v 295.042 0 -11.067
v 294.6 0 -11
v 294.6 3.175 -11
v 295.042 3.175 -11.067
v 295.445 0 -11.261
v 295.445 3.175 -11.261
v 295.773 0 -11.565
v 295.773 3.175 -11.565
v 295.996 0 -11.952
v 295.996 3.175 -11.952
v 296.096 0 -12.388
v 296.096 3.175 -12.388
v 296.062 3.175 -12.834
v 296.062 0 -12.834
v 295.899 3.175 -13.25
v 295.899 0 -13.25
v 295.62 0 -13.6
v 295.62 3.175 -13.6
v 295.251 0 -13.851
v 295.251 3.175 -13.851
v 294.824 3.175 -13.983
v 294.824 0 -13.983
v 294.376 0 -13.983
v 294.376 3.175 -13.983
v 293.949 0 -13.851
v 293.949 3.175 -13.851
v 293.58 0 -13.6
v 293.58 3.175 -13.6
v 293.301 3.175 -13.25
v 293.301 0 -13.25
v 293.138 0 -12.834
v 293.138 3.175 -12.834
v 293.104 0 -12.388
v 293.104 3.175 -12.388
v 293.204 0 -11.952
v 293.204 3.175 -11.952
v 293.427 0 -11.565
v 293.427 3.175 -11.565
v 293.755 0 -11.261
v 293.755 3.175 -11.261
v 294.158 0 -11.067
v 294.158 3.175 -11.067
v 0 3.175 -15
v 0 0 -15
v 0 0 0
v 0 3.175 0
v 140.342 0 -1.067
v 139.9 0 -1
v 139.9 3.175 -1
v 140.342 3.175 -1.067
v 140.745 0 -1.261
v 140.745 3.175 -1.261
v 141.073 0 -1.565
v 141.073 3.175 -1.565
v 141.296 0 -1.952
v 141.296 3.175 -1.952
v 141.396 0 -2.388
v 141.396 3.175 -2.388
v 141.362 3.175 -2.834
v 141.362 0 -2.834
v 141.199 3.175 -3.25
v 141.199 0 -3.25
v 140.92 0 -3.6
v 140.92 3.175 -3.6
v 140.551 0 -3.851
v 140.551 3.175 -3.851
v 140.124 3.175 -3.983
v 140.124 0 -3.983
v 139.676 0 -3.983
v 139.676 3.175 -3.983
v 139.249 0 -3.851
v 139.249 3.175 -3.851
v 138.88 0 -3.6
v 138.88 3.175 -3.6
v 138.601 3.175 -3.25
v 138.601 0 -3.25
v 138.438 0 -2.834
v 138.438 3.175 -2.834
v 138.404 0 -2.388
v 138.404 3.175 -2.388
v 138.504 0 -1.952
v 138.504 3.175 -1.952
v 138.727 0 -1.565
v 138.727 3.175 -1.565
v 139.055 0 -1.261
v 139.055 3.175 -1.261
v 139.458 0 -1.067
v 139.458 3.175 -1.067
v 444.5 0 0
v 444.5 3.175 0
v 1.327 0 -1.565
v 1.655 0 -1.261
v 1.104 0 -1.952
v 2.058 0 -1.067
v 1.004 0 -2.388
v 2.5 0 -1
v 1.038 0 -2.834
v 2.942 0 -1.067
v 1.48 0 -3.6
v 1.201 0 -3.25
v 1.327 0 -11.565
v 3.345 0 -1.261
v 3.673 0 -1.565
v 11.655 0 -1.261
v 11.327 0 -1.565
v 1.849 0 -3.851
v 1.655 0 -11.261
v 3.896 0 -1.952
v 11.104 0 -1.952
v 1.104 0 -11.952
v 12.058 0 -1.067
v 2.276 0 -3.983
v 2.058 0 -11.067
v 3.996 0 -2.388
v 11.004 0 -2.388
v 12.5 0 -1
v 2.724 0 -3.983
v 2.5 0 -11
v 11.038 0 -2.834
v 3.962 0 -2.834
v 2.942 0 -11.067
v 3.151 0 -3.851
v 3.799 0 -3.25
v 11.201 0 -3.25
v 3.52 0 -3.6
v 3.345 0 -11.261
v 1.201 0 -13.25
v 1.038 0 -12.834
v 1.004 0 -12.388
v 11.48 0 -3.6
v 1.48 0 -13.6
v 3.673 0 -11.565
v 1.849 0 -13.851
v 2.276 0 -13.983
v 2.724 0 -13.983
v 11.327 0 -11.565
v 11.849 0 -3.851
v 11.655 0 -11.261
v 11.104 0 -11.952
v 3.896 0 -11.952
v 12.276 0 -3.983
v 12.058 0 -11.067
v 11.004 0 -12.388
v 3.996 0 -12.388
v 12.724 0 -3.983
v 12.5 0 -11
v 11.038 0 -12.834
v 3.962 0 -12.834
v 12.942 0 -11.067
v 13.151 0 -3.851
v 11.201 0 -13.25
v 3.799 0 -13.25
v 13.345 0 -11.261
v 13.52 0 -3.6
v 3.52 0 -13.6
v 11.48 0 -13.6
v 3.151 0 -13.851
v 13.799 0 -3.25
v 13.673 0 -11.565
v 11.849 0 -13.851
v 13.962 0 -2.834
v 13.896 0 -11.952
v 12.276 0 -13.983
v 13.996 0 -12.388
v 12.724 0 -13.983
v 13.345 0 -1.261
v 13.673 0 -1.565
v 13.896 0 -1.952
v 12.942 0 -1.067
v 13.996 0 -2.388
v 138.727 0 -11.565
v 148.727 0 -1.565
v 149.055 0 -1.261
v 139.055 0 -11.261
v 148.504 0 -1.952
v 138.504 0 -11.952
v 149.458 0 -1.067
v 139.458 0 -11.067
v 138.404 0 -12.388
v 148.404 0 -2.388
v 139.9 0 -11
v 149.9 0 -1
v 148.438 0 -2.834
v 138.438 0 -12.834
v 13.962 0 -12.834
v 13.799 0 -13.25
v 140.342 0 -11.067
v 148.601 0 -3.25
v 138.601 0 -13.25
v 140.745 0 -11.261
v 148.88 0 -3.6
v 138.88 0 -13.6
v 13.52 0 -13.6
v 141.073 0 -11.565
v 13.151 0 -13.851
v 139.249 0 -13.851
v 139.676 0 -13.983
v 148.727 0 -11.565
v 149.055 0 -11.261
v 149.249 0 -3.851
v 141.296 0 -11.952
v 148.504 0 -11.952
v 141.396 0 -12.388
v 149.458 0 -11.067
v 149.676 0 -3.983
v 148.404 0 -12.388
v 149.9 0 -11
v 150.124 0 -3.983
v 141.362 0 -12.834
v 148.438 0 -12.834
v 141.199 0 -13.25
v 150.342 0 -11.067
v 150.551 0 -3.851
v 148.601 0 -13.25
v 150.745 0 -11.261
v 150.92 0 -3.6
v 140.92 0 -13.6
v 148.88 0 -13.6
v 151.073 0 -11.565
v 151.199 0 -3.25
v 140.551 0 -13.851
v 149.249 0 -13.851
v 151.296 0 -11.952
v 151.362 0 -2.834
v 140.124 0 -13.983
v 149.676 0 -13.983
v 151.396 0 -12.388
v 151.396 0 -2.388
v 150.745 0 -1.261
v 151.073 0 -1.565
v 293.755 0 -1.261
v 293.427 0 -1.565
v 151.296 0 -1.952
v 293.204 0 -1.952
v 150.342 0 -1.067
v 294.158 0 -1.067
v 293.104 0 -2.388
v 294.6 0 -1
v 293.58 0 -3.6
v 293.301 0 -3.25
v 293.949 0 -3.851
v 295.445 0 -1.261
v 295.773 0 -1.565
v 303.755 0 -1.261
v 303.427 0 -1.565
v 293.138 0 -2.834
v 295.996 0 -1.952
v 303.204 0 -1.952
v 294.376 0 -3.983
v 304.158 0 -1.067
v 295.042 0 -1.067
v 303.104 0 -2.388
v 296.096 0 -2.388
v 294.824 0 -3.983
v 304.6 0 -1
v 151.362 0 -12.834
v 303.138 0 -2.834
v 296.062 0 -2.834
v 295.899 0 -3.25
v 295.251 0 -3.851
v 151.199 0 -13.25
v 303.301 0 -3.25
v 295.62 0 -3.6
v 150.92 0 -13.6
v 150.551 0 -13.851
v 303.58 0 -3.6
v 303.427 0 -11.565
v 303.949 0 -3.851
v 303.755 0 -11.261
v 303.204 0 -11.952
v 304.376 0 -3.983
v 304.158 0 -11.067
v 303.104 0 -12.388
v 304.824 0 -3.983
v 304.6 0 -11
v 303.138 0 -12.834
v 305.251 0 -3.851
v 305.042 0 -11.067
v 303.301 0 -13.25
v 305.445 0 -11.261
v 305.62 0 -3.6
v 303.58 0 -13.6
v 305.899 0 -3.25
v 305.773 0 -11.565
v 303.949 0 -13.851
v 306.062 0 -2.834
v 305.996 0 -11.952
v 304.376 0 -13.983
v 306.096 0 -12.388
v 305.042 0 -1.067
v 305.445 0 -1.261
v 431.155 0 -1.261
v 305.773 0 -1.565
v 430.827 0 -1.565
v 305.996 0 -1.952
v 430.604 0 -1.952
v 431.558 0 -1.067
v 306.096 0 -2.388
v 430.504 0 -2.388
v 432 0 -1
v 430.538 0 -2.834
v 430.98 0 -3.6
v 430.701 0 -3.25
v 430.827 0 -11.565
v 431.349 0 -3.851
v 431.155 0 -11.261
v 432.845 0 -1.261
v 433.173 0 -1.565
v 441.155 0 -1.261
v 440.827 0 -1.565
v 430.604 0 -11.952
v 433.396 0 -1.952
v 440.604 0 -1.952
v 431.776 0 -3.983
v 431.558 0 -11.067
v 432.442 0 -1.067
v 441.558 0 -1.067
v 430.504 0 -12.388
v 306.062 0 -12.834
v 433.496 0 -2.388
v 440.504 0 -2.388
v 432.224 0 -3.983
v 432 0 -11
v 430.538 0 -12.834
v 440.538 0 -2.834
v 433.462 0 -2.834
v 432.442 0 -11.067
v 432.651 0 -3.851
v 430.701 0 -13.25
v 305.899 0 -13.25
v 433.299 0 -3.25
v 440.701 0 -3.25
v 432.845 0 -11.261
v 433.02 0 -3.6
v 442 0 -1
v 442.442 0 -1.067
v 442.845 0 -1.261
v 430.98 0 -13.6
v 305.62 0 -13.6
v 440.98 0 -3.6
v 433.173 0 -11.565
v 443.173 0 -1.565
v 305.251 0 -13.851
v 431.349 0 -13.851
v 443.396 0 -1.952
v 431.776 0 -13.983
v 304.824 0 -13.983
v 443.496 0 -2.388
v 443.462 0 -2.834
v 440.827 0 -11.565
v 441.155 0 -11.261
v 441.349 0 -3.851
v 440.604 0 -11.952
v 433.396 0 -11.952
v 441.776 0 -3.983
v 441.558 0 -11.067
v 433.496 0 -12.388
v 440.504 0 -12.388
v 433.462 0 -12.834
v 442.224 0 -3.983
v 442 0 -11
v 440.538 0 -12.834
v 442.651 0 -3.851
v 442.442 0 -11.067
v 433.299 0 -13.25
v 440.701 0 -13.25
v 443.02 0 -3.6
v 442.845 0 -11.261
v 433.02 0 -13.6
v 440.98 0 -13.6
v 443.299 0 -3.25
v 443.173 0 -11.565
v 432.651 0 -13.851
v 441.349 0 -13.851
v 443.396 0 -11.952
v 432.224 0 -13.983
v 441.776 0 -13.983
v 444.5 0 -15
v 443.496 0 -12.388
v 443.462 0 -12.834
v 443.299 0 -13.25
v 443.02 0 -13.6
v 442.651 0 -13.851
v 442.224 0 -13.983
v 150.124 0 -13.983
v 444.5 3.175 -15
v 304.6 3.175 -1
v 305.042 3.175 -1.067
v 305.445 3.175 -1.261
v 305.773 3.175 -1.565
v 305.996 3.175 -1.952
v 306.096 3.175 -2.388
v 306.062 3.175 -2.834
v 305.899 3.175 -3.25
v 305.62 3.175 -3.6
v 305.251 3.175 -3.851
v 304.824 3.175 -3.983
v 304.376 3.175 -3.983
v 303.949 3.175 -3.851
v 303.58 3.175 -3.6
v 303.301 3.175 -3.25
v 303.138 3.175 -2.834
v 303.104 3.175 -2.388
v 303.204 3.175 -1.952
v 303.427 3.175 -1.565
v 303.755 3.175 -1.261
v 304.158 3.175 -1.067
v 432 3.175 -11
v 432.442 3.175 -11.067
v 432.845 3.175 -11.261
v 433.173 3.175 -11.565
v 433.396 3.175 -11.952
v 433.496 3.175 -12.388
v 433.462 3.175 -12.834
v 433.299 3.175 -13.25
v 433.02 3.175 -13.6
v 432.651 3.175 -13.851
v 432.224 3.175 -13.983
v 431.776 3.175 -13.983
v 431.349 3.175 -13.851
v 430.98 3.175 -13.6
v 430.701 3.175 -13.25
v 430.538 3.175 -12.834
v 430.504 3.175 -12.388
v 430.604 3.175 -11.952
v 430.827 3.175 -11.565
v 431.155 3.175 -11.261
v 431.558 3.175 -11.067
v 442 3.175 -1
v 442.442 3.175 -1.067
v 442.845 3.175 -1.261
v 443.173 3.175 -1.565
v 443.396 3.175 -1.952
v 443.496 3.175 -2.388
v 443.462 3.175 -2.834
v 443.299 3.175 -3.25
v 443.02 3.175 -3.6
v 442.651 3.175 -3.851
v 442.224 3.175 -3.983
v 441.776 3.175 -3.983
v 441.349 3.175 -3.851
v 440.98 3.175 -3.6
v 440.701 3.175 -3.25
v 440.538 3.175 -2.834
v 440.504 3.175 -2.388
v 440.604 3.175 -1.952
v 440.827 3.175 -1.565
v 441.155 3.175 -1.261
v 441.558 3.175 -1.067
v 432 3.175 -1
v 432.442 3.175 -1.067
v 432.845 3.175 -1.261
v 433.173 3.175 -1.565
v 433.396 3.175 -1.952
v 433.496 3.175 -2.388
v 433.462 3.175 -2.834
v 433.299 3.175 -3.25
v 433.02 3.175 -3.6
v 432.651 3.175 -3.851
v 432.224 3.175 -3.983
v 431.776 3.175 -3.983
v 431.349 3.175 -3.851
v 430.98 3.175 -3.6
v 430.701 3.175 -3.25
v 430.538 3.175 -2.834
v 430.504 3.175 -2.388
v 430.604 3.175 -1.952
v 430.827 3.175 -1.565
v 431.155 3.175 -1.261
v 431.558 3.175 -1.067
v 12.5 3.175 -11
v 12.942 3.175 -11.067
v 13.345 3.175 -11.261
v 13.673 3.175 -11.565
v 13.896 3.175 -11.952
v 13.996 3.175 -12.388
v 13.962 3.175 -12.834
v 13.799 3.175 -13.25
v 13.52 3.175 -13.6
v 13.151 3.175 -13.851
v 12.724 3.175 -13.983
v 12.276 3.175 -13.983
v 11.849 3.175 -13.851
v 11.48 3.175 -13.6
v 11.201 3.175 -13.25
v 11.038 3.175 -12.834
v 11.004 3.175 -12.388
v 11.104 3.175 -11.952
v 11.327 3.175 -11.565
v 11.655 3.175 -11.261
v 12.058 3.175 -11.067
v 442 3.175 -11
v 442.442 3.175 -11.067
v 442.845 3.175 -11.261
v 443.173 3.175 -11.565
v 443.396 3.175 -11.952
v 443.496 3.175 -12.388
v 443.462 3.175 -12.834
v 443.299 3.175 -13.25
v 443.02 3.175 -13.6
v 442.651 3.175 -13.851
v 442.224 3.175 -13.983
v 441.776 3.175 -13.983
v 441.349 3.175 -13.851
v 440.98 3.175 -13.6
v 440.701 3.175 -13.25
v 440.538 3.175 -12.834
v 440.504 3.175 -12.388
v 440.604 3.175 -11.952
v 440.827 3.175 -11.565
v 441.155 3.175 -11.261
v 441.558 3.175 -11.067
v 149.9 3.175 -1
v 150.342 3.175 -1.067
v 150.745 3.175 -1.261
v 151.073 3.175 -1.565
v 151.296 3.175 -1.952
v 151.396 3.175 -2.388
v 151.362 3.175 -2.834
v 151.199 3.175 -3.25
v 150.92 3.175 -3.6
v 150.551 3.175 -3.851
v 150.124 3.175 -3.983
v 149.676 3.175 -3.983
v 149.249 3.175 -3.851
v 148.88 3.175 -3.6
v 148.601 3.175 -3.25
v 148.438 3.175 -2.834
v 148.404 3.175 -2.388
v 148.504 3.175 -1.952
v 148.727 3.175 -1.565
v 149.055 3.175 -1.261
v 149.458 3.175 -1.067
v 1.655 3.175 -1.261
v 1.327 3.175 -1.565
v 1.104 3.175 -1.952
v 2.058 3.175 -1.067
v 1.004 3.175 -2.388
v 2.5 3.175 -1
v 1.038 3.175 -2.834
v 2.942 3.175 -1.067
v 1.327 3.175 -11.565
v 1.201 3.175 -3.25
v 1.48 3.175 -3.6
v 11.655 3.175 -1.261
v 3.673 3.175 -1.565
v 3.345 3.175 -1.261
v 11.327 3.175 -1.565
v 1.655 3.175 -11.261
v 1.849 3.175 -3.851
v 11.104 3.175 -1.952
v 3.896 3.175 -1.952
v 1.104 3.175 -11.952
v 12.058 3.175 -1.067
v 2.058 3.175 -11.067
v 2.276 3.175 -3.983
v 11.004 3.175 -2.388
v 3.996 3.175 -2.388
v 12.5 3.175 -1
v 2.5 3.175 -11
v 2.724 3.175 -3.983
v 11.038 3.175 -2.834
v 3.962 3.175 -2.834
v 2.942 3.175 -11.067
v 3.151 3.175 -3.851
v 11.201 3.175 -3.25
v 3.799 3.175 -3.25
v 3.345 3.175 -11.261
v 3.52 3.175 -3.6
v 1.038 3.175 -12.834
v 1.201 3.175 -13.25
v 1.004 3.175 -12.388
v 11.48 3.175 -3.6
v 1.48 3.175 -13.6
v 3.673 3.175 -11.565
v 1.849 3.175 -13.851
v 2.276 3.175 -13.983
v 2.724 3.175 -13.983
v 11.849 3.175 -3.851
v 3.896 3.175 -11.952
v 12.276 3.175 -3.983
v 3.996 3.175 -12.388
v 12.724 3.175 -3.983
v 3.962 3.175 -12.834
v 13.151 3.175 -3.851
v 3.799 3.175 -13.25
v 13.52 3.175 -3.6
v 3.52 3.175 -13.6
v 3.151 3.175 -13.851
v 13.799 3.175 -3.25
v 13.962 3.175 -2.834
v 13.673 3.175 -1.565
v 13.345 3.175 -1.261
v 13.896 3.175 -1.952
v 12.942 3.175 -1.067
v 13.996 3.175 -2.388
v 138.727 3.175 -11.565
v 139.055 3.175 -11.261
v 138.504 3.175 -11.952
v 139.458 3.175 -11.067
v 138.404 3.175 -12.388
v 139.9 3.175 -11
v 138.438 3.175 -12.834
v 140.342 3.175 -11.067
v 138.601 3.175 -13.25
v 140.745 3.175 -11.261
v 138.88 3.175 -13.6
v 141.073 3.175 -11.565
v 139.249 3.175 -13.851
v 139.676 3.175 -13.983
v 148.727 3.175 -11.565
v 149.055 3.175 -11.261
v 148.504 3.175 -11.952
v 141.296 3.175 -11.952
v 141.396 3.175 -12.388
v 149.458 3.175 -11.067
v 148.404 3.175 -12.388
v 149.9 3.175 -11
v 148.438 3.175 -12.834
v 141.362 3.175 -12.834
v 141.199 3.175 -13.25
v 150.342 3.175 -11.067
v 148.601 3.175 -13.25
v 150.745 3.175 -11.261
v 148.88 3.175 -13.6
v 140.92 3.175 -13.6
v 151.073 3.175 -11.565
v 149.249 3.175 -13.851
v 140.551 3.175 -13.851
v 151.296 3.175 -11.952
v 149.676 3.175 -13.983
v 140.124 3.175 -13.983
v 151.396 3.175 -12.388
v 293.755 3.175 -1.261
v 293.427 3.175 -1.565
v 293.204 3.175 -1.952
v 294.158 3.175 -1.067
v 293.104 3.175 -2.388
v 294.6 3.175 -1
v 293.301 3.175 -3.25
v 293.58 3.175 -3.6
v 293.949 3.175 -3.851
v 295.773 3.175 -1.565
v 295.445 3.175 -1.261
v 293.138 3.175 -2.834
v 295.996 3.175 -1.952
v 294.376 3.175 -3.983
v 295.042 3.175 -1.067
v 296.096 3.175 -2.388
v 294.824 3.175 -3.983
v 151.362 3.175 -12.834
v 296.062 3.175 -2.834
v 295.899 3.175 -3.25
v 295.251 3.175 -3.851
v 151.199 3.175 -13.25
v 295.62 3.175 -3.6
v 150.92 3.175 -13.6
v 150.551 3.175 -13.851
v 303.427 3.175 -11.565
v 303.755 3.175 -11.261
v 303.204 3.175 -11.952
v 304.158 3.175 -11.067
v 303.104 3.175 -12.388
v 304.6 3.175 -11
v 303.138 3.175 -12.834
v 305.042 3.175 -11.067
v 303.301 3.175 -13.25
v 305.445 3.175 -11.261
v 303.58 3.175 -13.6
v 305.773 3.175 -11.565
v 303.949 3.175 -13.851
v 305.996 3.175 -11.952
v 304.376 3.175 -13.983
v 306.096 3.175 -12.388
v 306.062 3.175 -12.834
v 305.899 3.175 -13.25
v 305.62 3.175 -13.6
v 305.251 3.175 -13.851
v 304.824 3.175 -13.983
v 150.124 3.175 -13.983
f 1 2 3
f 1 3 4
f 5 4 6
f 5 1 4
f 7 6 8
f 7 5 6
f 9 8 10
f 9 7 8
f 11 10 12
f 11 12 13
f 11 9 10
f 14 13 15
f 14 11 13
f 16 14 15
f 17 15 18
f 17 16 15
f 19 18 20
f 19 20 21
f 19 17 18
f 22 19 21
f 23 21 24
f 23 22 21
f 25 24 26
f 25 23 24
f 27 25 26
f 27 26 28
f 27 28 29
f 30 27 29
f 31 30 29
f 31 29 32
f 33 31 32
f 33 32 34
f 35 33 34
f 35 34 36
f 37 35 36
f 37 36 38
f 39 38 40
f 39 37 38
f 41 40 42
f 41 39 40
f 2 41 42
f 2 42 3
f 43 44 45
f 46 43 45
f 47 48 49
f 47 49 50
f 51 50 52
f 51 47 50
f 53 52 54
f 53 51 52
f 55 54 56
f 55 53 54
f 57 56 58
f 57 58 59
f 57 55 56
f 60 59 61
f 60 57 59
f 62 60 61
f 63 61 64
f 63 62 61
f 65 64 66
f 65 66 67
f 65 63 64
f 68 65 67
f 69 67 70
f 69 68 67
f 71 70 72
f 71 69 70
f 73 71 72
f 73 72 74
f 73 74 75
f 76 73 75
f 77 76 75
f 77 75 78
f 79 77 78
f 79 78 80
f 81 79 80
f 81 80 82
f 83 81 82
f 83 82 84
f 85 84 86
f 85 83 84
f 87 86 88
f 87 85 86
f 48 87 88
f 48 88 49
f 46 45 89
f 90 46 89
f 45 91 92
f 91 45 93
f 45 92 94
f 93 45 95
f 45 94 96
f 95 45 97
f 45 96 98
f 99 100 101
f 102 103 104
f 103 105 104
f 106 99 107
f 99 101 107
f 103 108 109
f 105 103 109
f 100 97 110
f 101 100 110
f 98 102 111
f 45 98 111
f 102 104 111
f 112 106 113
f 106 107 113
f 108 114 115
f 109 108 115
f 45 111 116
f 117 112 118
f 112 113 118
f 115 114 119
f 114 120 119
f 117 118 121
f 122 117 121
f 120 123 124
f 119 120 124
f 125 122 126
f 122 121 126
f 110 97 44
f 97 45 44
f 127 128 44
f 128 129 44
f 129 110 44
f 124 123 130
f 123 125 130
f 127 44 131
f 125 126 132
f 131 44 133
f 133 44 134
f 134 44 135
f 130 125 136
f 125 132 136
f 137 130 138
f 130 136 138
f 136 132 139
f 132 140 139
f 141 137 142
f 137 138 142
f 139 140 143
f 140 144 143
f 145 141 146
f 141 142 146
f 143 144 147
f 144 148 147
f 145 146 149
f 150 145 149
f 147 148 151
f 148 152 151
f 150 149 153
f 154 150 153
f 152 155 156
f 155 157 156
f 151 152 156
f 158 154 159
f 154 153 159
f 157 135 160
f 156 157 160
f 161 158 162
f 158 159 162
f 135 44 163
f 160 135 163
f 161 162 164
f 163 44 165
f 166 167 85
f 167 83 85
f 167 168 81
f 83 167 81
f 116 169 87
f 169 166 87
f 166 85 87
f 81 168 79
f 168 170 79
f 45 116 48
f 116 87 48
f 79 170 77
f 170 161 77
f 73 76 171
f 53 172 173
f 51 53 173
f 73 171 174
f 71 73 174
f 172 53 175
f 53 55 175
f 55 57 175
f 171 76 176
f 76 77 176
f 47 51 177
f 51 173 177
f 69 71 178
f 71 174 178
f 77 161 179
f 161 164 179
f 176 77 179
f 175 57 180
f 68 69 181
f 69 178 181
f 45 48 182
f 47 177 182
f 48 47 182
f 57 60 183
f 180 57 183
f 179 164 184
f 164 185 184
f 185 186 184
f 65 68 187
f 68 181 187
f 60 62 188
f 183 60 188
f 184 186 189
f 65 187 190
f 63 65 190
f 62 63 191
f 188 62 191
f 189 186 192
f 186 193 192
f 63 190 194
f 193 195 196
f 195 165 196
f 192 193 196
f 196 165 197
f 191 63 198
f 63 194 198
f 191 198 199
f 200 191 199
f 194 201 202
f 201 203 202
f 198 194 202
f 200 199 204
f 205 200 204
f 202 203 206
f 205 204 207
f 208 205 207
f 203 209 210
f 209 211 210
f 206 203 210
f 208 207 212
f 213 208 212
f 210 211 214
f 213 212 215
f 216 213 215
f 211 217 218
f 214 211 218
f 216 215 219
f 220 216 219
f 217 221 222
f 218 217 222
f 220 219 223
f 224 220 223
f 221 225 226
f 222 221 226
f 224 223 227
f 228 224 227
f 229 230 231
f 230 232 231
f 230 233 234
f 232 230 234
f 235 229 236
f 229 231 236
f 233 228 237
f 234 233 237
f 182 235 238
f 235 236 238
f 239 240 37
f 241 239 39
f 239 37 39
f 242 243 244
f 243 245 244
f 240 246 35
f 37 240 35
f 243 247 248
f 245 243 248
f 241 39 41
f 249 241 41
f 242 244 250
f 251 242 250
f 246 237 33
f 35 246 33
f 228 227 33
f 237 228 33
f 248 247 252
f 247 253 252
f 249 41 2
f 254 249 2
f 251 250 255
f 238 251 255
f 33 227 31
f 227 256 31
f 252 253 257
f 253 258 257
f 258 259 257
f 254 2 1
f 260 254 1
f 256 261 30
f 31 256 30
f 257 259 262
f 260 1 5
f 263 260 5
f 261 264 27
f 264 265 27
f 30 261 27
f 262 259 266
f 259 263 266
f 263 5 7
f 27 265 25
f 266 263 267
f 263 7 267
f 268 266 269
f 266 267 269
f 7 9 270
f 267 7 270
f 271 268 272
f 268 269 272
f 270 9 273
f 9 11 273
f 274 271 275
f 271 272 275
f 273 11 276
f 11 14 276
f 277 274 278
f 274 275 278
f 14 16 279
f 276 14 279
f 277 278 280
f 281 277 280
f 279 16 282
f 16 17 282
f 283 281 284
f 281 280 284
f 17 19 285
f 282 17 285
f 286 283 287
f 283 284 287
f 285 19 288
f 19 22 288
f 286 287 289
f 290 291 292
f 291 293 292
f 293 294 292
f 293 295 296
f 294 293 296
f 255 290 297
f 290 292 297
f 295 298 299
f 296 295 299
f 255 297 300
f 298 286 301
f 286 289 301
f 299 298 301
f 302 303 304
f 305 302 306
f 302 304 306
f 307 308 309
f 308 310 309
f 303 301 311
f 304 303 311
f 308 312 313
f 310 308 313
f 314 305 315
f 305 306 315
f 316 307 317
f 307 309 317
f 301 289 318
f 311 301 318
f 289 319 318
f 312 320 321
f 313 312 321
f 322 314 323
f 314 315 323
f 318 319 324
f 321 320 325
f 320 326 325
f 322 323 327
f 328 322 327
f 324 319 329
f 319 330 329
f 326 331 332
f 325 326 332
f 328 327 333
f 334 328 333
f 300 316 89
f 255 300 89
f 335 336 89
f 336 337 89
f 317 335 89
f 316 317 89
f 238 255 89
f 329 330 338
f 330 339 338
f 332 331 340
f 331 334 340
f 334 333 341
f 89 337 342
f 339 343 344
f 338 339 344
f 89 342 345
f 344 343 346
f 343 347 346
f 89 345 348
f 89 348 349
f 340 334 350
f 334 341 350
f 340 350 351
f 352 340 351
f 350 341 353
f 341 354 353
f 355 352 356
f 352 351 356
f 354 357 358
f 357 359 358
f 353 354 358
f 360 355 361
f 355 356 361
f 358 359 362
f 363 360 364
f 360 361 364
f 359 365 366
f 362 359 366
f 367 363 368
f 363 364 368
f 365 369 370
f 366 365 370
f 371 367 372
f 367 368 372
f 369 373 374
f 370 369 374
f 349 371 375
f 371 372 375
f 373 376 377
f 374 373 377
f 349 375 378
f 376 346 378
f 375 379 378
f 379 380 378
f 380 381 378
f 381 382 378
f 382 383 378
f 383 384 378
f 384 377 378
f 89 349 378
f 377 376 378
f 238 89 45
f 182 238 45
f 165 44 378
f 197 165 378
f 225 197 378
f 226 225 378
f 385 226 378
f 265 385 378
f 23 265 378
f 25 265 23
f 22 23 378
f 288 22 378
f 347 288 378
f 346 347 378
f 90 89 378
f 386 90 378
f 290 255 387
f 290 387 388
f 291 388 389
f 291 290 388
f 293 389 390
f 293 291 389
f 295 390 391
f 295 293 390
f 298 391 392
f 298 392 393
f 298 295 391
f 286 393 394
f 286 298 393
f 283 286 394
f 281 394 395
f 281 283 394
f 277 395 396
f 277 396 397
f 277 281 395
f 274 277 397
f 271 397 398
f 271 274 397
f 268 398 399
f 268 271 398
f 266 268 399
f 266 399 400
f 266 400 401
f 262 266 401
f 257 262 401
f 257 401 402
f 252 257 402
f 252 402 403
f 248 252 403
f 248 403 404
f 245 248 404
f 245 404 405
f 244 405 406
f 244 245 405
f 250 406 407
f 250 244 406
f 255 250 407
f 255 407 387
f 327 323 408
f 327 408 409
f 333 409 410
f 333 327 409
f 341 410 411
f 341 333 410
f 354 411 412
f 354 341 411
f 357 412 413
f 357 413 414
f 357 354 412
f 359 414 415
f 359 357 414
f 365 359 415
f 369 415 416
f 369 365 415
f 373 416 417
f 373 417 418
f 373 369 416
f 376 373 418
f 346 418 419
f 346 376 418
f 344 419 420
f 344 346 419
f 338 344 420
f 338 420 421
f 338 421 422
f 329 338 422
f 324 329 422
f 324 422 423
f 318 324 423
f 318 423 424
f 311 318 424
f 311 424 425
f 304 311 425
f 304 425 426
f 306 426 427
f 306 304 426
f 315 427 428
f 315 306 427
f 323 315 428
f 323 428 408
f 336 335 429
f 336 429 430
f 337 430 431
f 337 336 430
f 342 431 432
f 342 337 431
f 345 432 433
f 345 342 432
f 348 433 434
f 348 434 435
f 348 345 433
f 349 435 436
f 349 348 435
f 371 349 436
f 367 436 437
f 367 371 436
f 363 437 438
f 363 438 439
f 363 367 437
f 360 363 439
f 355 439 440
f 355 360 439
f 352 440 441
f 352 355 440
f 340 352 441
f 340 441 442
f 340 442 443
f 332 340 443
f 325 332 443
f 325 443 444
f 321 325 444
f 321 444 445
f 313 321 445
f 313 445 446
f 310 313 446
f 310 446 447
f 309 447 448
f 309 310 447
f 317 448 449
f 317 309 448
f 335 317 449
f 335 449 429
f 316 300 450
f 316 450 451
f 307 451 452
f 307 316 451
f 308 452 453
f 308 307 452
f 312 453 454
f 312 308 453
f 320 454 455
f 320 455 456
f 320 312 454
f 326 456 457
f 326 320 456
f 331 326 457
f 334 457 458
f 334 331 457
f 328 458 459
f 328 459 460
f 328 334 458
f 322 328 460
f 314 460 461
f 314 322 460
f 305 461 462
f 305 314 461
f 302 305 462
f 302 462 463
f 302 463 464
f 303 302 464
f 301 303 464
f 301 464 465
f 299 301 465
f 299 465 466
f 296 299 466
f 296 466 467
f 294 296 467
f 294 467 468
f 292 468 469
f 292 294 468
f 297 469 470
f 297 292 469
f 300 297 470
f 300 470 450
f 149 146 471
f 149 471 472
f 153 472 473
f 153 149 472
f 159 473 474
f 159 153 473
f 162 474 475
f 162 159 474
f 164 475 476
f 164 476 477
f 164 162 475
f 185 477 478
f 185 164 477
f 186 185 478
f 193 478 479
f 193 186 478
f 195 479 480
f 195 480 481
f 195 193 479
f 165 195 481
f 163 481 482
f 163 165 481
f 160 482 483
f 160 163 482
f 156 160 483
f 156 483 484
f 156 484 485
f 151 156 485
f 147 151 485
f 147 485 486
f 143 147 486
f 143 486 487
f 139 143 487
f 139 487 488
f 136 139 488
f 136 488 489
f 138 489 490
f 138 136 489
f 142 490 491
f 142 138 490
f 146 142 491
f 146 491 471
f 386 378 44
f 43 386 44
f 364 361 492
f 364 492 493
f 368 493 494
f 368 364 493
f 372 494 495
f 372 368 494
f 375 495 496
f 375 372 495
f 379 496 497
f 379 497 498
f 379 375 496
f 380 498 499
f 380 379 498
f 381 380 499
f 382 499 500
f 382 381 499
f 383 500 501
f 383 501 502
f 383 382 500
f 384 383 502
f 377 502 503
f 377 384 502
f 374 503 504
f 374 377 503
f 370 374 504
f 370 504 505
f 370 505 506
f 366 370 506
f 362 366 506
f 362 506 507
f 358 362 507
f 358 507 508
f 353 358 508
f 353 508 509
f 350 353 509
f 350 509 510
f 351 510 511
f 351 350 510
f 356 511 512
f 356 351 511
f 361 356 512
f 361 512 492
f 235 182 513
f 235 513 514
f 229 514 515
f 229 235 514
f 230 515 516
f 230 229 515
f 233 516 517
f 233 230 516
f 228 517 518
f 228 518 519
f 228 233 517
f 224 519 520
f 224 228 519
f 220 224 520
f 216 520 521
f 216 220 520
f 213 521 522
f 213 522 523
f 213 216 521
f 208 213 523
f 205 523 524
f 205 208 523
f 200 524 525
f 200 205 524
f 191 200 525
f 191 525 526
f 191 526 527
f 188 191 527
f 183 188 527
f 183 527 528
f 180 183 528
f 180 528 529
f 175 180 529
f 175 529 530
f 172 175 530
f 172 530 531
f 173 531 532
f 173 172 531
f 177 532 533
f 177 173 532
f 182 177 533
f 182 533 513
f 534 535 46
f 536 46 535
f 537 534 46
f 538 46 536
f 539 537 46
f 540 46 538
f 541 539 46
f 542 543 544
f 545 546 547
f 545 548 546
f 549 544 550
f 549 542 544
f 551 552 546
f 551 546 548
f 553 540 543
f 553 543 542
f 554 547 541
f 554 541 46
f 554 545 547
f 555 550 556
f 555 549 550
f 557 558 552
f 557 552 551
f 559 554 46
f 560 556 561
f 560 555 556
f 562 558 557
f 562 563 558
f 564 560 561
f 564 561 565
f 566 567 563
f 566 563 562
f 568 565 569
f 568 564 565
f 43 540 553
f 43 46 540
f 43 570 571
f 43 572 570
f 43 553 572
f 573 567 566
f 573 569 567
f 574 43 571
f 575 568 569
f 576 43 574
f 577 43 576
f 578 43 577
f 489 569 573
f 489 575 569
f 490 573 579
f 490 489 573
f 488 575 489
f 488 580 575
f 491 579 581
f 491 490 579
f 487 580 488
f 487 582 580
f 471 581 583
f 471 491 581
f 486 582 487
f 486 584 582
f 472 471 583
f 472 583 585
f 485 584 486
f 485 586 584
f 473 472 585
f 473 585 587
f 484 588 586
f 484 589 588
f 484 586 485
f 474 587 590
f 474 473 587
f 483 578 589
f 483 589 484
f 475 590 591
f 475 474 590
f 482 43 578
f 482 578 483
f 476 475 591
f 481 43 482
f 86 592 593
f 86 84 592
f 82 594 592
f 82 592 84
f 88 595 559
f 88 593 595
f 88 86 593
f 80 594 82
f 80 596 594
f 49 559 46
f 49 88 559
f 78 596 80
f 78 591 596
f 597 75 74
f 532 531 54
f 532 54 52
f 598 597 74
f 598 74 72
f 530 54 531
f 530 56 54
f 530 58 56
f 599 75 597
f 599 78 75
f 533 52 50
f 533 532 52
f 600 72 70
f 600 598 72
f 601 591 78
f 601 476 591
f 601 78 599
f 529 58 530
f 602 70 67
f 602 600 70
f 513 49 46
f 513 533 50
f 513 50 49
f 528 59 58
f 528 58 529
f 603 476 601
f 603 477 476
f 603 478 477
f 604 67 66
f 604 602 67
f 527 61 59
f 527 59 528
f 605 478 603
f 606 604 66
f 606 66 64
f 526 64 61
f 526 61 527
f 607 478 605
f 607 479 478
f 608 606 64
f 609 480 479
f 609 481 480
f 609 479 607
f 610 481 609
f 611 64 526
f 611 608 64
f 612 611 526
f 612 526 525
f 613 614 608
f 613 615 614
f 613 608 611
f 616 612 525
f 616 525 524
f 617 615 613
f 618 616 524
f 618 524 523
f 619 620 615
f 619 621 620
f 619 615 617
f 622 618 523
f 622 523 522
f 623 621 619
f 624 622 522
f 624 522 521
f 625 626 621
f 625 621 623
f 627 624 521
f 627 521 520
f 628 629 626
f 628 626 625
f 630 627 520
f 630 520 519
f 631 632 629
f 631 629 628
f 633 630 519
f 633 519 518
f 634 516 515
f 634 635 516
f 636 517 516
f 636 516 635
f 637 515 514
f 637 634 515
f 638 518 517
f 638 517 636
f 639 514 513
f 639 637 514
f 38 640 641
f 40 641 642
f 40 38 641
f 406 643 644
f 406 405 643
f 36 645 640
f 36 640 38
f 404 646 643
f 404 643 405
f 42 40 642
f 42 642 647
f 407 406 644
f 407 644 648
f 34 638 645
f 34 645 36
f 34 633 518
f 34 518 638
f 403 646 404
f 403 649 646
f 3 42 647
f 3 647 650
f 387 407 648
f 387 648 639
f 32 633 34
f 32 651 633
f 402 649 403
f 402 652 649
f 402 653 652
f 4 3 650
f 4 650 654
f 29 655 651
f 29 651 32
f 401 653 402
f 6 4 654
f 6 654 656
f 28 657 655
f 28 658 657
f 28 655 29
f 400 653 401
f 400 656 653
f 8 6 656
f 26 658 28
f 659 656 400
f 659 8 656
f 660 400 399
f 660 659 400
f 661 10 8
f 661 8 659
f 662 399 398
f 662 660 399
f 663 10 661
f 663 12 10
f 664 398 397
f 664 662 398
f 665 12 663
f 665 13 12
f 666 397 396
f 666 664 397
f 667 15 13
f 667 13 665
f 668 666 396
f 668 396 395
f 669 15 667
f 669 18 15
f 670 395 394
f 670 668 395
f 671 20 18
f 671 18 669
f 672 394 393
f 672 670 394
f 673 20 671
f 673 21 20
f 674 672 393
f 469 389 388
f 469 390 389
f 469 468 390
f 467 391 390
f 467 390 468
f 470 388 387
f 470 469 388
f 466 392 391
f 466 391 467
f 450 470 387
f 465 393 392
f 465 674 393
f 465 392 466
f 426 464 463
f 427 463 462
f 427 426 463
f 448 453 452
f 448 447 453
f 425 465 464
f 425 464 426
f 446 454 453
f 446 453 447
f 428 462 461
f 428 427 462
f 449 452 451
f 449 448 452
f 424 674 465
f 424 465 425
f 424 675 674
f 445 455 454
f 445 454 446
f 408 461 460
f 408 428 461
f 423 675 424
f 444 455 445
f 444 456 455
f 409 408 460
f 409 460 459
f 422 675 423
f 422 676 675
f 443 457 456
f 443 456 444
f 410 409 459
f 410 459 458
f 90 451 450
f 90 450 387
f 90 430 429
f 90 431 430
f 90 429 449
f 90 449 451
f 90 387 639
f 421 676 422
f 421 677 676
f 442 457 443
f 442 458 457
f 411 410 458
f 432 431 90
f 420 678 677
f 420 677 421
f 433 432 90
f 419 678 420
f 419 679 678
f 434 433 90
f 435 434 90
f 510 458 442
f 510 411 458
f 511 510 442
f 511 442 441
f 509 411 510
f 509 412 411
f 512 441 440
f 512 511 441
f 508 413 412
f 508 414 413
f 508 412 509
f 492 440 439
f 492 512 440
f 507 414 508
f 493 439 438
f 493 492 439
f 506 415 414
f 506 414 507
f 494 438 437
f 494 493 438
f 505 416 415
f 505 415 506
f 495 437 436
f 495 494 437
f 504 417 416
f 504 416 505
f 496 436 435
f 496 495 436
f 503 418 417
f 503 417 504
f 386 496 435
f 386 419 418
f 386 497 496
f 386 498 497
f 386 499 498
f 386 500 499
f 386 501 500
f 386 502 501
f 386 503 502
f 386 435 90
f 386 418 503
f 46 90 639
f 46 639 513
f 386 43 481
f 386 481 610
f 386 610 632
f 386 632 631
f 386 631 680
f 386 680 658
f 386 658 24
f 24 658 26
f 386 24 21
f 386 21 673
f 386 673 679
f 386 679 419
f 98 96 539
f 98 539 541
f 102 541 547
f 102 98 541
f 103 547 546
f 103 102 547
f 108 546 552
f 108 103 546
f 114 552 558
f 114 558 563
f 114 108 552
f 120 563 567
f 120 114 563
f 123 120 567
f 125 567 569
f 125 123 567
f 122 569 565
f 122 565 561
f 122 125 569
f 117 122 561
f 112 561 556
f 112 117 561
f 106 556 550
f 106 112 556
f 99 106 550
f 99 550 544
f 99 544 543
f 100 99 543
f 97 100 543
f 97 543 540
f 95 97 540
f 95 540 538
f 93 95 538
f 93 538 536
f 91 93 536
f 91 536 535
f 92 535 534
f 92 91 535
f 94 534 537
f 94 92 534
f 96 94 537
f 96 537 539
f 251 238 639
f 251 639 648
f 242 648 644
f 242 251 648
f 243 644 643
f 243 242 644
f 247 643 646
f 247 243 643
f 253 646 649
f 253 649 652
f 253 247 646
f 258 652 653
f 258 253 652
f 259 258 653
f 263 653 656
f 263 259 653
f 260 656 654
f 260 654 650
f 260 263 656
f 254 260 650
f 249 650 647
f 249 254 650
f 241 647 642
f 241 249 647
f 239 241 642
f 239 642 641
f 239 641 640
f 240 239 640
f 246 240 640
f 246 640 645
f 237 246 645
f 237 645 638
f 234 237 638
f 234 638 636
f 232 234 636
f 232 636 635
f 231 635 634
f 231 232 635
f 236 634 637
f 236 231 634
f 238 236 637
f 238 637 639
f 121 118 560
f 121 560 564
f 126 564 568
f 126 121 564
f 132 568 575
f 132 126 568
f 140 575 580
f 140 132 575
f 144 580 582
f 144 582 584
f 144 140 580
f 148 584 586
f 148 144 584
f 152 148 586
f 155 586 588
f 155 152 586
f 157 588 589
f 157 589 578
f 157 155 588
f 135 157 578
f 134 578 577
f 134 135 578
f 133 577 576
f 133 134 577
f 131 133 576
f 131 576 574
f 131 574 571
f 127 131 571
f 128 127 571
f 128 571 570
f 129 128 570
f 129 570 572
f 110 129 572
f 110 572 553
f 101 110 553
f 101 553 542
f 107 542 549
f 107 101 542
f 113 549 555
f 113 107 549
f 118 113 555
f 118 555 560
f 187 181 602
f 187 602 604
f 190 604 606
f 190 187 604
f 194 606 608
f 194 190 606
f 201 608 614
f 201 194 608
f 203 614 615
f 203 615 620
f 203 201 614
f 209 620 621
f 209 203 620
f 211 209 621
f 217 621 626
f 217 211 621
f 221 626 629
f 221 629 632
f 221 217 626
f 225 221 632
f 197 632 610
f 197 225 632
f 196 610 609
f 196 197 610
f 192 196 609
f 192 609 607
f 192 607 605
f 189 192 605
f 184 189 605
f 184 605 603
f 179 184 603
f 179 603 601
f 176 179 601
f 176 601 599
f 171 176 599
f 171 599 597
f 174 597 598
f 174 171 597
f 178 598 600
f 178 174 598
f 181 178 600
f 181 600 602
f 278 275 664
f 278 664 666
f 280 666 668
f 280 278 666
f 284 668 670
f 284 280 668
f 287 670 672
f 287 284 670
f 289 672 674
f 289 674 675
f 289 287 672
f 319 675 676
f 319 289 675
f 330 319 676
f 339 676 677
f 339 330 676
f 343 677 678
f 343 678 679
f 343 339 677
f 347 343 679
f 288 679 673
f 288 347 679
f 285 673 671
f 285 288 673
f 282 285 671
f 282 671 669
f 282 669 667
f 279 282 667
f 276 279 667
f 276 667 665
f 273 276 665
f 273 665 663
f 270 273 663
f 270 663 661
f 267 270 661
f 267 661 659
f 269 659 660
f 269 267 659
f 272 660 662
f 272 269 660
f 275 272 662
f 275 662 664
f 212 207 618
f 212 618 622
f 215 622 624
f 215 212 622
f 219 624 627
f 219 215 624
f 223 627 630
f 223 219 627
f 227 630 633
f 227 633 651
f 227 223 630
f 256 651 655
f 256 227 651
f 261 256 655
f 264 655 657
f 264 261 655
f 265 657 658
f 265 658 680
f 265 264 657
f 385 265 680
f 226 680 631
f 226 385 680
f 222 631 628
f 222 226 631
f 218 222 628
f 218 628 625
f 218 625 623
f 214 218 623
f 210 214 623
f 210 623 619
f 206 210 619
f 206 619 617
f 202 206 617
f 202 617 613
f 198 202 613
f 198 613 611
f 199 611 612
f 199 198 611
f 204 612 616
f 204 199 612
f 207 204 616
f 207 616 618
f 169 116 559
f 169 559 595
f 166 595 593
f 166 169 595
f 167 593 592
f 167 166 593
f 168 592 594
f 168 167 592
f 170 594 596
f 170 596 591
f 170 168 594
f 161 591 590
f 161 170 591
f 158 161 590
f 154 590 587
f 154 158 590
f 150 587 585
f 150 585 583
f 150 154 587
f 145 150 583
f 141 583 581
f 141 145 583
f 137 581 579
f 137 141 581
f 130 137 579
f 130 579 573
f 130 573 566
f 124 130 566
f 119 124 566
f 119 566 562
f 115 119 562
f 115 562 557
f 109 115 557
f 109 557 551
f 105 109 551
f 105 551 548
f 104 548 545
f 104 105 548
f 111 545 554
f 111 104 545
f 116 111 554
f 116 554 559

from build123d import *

# Parameters (mm, degrees)
SKETCH1_R           = 1.5
BOSS_EXTRUDE1_DEPTH = 3.175


with BuildPart() as part:
    # Sketch1 → Boss-Extrude1 (new body)
    with BuildSketch(Plane(origin=(0, 0, 0), x_dir=(1, 0, 0), z_dir=(0, 1, 0))):
        Polygon((0, 7.5), (0, 0), (444.5, 0), (444.5, 15), (0, 15), align=None)
        with Locations(Location((2.5, 2.5, 0), (0, 0, 270))):
            Circle(SKETCH1_R, mode=Mode.SUBTRACT)
        with Locations(Location((12.5, 2.5, 0), (0, 0, 270))):
            Circle(SKETCH1_R, mode=Mode.SUBTRACT)
        with Locations(Location((139.9, 2.5, 0), (0, 0, 270))):
            Circle(SKETCH1_R, mode=Mode.SUBTRACT)
        with Locations(Location((149.9, 2.5, 0), (0, 0, 270))):
            Circle(SKETCH1_R, mode=Mode.SUBTRACT)
        with Locations(Location((2.5, 12.5, 0), (0, 0, 270))):
            Circle(SKETCH1_R, mode=Mode.SUBTRACT)
        with Locations(Location((12.5, 12.5, 0), (0, 0, 270))):
            Circle(SKETCH1_R, mode=Mode.SUBTRACT)
        with Locations(Location((139.9, 12.5, 0), (0, 0, 270))):
            Circle(SKETCH1_R, mode=Mode.SUBTRACT)
        with Locations(Location((149.9, 12.5, 0), (0, 0, 270))):
            Circle(SKETCH1_R, mode=Mode.SUBTRACT)
        with Locations(Location((442, 12.5, 0), (0, 0, 270))):
            Circle(SKETCH1_R, mode=Mode.SUBTRACT)
        with Locations(Location((294.6, 2.5, 0), (0, 0, 270))):
            Circle(SKETCH1_R, mode=Mode.SUBTRACT)
        with Locations(Location((304.6, 2.5, 0), (0, 0, 270))):
            Circle(SKETCH1_R, mode=Mode.SUBTRACT)
        with Locations(Location((432, 2.5, 0), (0, 0, 270))):
            Circle(SKETCH1_R, mode=Mode.SUBTRACT)
        with Locations(Location((442, 2.5, 0), (0, 0, 270))):
            Circle(SKETCH1_R, mode=Mode.SUBTRACT)
        with Locations(Location((294.6, 12.5, 0), (0, 0, 270))):
            Circle(SKETCH1_R, mode=Mode.SUBTRACT)
        with Locations(Location((304.6, 12.5, 0), (0, 0, 270))):
            Circle(SKETCH1_R, mode=Mode.SUBTRACT)
        with Locations(Location((432, 12.5, 0), (0, 0, 270))):
            Circle(SKETCH1_R, mode=Mode.SUBTRACT)
    extrude(amount=BOSS_EXTRUDE1_DEPTH)


solid = part.part
